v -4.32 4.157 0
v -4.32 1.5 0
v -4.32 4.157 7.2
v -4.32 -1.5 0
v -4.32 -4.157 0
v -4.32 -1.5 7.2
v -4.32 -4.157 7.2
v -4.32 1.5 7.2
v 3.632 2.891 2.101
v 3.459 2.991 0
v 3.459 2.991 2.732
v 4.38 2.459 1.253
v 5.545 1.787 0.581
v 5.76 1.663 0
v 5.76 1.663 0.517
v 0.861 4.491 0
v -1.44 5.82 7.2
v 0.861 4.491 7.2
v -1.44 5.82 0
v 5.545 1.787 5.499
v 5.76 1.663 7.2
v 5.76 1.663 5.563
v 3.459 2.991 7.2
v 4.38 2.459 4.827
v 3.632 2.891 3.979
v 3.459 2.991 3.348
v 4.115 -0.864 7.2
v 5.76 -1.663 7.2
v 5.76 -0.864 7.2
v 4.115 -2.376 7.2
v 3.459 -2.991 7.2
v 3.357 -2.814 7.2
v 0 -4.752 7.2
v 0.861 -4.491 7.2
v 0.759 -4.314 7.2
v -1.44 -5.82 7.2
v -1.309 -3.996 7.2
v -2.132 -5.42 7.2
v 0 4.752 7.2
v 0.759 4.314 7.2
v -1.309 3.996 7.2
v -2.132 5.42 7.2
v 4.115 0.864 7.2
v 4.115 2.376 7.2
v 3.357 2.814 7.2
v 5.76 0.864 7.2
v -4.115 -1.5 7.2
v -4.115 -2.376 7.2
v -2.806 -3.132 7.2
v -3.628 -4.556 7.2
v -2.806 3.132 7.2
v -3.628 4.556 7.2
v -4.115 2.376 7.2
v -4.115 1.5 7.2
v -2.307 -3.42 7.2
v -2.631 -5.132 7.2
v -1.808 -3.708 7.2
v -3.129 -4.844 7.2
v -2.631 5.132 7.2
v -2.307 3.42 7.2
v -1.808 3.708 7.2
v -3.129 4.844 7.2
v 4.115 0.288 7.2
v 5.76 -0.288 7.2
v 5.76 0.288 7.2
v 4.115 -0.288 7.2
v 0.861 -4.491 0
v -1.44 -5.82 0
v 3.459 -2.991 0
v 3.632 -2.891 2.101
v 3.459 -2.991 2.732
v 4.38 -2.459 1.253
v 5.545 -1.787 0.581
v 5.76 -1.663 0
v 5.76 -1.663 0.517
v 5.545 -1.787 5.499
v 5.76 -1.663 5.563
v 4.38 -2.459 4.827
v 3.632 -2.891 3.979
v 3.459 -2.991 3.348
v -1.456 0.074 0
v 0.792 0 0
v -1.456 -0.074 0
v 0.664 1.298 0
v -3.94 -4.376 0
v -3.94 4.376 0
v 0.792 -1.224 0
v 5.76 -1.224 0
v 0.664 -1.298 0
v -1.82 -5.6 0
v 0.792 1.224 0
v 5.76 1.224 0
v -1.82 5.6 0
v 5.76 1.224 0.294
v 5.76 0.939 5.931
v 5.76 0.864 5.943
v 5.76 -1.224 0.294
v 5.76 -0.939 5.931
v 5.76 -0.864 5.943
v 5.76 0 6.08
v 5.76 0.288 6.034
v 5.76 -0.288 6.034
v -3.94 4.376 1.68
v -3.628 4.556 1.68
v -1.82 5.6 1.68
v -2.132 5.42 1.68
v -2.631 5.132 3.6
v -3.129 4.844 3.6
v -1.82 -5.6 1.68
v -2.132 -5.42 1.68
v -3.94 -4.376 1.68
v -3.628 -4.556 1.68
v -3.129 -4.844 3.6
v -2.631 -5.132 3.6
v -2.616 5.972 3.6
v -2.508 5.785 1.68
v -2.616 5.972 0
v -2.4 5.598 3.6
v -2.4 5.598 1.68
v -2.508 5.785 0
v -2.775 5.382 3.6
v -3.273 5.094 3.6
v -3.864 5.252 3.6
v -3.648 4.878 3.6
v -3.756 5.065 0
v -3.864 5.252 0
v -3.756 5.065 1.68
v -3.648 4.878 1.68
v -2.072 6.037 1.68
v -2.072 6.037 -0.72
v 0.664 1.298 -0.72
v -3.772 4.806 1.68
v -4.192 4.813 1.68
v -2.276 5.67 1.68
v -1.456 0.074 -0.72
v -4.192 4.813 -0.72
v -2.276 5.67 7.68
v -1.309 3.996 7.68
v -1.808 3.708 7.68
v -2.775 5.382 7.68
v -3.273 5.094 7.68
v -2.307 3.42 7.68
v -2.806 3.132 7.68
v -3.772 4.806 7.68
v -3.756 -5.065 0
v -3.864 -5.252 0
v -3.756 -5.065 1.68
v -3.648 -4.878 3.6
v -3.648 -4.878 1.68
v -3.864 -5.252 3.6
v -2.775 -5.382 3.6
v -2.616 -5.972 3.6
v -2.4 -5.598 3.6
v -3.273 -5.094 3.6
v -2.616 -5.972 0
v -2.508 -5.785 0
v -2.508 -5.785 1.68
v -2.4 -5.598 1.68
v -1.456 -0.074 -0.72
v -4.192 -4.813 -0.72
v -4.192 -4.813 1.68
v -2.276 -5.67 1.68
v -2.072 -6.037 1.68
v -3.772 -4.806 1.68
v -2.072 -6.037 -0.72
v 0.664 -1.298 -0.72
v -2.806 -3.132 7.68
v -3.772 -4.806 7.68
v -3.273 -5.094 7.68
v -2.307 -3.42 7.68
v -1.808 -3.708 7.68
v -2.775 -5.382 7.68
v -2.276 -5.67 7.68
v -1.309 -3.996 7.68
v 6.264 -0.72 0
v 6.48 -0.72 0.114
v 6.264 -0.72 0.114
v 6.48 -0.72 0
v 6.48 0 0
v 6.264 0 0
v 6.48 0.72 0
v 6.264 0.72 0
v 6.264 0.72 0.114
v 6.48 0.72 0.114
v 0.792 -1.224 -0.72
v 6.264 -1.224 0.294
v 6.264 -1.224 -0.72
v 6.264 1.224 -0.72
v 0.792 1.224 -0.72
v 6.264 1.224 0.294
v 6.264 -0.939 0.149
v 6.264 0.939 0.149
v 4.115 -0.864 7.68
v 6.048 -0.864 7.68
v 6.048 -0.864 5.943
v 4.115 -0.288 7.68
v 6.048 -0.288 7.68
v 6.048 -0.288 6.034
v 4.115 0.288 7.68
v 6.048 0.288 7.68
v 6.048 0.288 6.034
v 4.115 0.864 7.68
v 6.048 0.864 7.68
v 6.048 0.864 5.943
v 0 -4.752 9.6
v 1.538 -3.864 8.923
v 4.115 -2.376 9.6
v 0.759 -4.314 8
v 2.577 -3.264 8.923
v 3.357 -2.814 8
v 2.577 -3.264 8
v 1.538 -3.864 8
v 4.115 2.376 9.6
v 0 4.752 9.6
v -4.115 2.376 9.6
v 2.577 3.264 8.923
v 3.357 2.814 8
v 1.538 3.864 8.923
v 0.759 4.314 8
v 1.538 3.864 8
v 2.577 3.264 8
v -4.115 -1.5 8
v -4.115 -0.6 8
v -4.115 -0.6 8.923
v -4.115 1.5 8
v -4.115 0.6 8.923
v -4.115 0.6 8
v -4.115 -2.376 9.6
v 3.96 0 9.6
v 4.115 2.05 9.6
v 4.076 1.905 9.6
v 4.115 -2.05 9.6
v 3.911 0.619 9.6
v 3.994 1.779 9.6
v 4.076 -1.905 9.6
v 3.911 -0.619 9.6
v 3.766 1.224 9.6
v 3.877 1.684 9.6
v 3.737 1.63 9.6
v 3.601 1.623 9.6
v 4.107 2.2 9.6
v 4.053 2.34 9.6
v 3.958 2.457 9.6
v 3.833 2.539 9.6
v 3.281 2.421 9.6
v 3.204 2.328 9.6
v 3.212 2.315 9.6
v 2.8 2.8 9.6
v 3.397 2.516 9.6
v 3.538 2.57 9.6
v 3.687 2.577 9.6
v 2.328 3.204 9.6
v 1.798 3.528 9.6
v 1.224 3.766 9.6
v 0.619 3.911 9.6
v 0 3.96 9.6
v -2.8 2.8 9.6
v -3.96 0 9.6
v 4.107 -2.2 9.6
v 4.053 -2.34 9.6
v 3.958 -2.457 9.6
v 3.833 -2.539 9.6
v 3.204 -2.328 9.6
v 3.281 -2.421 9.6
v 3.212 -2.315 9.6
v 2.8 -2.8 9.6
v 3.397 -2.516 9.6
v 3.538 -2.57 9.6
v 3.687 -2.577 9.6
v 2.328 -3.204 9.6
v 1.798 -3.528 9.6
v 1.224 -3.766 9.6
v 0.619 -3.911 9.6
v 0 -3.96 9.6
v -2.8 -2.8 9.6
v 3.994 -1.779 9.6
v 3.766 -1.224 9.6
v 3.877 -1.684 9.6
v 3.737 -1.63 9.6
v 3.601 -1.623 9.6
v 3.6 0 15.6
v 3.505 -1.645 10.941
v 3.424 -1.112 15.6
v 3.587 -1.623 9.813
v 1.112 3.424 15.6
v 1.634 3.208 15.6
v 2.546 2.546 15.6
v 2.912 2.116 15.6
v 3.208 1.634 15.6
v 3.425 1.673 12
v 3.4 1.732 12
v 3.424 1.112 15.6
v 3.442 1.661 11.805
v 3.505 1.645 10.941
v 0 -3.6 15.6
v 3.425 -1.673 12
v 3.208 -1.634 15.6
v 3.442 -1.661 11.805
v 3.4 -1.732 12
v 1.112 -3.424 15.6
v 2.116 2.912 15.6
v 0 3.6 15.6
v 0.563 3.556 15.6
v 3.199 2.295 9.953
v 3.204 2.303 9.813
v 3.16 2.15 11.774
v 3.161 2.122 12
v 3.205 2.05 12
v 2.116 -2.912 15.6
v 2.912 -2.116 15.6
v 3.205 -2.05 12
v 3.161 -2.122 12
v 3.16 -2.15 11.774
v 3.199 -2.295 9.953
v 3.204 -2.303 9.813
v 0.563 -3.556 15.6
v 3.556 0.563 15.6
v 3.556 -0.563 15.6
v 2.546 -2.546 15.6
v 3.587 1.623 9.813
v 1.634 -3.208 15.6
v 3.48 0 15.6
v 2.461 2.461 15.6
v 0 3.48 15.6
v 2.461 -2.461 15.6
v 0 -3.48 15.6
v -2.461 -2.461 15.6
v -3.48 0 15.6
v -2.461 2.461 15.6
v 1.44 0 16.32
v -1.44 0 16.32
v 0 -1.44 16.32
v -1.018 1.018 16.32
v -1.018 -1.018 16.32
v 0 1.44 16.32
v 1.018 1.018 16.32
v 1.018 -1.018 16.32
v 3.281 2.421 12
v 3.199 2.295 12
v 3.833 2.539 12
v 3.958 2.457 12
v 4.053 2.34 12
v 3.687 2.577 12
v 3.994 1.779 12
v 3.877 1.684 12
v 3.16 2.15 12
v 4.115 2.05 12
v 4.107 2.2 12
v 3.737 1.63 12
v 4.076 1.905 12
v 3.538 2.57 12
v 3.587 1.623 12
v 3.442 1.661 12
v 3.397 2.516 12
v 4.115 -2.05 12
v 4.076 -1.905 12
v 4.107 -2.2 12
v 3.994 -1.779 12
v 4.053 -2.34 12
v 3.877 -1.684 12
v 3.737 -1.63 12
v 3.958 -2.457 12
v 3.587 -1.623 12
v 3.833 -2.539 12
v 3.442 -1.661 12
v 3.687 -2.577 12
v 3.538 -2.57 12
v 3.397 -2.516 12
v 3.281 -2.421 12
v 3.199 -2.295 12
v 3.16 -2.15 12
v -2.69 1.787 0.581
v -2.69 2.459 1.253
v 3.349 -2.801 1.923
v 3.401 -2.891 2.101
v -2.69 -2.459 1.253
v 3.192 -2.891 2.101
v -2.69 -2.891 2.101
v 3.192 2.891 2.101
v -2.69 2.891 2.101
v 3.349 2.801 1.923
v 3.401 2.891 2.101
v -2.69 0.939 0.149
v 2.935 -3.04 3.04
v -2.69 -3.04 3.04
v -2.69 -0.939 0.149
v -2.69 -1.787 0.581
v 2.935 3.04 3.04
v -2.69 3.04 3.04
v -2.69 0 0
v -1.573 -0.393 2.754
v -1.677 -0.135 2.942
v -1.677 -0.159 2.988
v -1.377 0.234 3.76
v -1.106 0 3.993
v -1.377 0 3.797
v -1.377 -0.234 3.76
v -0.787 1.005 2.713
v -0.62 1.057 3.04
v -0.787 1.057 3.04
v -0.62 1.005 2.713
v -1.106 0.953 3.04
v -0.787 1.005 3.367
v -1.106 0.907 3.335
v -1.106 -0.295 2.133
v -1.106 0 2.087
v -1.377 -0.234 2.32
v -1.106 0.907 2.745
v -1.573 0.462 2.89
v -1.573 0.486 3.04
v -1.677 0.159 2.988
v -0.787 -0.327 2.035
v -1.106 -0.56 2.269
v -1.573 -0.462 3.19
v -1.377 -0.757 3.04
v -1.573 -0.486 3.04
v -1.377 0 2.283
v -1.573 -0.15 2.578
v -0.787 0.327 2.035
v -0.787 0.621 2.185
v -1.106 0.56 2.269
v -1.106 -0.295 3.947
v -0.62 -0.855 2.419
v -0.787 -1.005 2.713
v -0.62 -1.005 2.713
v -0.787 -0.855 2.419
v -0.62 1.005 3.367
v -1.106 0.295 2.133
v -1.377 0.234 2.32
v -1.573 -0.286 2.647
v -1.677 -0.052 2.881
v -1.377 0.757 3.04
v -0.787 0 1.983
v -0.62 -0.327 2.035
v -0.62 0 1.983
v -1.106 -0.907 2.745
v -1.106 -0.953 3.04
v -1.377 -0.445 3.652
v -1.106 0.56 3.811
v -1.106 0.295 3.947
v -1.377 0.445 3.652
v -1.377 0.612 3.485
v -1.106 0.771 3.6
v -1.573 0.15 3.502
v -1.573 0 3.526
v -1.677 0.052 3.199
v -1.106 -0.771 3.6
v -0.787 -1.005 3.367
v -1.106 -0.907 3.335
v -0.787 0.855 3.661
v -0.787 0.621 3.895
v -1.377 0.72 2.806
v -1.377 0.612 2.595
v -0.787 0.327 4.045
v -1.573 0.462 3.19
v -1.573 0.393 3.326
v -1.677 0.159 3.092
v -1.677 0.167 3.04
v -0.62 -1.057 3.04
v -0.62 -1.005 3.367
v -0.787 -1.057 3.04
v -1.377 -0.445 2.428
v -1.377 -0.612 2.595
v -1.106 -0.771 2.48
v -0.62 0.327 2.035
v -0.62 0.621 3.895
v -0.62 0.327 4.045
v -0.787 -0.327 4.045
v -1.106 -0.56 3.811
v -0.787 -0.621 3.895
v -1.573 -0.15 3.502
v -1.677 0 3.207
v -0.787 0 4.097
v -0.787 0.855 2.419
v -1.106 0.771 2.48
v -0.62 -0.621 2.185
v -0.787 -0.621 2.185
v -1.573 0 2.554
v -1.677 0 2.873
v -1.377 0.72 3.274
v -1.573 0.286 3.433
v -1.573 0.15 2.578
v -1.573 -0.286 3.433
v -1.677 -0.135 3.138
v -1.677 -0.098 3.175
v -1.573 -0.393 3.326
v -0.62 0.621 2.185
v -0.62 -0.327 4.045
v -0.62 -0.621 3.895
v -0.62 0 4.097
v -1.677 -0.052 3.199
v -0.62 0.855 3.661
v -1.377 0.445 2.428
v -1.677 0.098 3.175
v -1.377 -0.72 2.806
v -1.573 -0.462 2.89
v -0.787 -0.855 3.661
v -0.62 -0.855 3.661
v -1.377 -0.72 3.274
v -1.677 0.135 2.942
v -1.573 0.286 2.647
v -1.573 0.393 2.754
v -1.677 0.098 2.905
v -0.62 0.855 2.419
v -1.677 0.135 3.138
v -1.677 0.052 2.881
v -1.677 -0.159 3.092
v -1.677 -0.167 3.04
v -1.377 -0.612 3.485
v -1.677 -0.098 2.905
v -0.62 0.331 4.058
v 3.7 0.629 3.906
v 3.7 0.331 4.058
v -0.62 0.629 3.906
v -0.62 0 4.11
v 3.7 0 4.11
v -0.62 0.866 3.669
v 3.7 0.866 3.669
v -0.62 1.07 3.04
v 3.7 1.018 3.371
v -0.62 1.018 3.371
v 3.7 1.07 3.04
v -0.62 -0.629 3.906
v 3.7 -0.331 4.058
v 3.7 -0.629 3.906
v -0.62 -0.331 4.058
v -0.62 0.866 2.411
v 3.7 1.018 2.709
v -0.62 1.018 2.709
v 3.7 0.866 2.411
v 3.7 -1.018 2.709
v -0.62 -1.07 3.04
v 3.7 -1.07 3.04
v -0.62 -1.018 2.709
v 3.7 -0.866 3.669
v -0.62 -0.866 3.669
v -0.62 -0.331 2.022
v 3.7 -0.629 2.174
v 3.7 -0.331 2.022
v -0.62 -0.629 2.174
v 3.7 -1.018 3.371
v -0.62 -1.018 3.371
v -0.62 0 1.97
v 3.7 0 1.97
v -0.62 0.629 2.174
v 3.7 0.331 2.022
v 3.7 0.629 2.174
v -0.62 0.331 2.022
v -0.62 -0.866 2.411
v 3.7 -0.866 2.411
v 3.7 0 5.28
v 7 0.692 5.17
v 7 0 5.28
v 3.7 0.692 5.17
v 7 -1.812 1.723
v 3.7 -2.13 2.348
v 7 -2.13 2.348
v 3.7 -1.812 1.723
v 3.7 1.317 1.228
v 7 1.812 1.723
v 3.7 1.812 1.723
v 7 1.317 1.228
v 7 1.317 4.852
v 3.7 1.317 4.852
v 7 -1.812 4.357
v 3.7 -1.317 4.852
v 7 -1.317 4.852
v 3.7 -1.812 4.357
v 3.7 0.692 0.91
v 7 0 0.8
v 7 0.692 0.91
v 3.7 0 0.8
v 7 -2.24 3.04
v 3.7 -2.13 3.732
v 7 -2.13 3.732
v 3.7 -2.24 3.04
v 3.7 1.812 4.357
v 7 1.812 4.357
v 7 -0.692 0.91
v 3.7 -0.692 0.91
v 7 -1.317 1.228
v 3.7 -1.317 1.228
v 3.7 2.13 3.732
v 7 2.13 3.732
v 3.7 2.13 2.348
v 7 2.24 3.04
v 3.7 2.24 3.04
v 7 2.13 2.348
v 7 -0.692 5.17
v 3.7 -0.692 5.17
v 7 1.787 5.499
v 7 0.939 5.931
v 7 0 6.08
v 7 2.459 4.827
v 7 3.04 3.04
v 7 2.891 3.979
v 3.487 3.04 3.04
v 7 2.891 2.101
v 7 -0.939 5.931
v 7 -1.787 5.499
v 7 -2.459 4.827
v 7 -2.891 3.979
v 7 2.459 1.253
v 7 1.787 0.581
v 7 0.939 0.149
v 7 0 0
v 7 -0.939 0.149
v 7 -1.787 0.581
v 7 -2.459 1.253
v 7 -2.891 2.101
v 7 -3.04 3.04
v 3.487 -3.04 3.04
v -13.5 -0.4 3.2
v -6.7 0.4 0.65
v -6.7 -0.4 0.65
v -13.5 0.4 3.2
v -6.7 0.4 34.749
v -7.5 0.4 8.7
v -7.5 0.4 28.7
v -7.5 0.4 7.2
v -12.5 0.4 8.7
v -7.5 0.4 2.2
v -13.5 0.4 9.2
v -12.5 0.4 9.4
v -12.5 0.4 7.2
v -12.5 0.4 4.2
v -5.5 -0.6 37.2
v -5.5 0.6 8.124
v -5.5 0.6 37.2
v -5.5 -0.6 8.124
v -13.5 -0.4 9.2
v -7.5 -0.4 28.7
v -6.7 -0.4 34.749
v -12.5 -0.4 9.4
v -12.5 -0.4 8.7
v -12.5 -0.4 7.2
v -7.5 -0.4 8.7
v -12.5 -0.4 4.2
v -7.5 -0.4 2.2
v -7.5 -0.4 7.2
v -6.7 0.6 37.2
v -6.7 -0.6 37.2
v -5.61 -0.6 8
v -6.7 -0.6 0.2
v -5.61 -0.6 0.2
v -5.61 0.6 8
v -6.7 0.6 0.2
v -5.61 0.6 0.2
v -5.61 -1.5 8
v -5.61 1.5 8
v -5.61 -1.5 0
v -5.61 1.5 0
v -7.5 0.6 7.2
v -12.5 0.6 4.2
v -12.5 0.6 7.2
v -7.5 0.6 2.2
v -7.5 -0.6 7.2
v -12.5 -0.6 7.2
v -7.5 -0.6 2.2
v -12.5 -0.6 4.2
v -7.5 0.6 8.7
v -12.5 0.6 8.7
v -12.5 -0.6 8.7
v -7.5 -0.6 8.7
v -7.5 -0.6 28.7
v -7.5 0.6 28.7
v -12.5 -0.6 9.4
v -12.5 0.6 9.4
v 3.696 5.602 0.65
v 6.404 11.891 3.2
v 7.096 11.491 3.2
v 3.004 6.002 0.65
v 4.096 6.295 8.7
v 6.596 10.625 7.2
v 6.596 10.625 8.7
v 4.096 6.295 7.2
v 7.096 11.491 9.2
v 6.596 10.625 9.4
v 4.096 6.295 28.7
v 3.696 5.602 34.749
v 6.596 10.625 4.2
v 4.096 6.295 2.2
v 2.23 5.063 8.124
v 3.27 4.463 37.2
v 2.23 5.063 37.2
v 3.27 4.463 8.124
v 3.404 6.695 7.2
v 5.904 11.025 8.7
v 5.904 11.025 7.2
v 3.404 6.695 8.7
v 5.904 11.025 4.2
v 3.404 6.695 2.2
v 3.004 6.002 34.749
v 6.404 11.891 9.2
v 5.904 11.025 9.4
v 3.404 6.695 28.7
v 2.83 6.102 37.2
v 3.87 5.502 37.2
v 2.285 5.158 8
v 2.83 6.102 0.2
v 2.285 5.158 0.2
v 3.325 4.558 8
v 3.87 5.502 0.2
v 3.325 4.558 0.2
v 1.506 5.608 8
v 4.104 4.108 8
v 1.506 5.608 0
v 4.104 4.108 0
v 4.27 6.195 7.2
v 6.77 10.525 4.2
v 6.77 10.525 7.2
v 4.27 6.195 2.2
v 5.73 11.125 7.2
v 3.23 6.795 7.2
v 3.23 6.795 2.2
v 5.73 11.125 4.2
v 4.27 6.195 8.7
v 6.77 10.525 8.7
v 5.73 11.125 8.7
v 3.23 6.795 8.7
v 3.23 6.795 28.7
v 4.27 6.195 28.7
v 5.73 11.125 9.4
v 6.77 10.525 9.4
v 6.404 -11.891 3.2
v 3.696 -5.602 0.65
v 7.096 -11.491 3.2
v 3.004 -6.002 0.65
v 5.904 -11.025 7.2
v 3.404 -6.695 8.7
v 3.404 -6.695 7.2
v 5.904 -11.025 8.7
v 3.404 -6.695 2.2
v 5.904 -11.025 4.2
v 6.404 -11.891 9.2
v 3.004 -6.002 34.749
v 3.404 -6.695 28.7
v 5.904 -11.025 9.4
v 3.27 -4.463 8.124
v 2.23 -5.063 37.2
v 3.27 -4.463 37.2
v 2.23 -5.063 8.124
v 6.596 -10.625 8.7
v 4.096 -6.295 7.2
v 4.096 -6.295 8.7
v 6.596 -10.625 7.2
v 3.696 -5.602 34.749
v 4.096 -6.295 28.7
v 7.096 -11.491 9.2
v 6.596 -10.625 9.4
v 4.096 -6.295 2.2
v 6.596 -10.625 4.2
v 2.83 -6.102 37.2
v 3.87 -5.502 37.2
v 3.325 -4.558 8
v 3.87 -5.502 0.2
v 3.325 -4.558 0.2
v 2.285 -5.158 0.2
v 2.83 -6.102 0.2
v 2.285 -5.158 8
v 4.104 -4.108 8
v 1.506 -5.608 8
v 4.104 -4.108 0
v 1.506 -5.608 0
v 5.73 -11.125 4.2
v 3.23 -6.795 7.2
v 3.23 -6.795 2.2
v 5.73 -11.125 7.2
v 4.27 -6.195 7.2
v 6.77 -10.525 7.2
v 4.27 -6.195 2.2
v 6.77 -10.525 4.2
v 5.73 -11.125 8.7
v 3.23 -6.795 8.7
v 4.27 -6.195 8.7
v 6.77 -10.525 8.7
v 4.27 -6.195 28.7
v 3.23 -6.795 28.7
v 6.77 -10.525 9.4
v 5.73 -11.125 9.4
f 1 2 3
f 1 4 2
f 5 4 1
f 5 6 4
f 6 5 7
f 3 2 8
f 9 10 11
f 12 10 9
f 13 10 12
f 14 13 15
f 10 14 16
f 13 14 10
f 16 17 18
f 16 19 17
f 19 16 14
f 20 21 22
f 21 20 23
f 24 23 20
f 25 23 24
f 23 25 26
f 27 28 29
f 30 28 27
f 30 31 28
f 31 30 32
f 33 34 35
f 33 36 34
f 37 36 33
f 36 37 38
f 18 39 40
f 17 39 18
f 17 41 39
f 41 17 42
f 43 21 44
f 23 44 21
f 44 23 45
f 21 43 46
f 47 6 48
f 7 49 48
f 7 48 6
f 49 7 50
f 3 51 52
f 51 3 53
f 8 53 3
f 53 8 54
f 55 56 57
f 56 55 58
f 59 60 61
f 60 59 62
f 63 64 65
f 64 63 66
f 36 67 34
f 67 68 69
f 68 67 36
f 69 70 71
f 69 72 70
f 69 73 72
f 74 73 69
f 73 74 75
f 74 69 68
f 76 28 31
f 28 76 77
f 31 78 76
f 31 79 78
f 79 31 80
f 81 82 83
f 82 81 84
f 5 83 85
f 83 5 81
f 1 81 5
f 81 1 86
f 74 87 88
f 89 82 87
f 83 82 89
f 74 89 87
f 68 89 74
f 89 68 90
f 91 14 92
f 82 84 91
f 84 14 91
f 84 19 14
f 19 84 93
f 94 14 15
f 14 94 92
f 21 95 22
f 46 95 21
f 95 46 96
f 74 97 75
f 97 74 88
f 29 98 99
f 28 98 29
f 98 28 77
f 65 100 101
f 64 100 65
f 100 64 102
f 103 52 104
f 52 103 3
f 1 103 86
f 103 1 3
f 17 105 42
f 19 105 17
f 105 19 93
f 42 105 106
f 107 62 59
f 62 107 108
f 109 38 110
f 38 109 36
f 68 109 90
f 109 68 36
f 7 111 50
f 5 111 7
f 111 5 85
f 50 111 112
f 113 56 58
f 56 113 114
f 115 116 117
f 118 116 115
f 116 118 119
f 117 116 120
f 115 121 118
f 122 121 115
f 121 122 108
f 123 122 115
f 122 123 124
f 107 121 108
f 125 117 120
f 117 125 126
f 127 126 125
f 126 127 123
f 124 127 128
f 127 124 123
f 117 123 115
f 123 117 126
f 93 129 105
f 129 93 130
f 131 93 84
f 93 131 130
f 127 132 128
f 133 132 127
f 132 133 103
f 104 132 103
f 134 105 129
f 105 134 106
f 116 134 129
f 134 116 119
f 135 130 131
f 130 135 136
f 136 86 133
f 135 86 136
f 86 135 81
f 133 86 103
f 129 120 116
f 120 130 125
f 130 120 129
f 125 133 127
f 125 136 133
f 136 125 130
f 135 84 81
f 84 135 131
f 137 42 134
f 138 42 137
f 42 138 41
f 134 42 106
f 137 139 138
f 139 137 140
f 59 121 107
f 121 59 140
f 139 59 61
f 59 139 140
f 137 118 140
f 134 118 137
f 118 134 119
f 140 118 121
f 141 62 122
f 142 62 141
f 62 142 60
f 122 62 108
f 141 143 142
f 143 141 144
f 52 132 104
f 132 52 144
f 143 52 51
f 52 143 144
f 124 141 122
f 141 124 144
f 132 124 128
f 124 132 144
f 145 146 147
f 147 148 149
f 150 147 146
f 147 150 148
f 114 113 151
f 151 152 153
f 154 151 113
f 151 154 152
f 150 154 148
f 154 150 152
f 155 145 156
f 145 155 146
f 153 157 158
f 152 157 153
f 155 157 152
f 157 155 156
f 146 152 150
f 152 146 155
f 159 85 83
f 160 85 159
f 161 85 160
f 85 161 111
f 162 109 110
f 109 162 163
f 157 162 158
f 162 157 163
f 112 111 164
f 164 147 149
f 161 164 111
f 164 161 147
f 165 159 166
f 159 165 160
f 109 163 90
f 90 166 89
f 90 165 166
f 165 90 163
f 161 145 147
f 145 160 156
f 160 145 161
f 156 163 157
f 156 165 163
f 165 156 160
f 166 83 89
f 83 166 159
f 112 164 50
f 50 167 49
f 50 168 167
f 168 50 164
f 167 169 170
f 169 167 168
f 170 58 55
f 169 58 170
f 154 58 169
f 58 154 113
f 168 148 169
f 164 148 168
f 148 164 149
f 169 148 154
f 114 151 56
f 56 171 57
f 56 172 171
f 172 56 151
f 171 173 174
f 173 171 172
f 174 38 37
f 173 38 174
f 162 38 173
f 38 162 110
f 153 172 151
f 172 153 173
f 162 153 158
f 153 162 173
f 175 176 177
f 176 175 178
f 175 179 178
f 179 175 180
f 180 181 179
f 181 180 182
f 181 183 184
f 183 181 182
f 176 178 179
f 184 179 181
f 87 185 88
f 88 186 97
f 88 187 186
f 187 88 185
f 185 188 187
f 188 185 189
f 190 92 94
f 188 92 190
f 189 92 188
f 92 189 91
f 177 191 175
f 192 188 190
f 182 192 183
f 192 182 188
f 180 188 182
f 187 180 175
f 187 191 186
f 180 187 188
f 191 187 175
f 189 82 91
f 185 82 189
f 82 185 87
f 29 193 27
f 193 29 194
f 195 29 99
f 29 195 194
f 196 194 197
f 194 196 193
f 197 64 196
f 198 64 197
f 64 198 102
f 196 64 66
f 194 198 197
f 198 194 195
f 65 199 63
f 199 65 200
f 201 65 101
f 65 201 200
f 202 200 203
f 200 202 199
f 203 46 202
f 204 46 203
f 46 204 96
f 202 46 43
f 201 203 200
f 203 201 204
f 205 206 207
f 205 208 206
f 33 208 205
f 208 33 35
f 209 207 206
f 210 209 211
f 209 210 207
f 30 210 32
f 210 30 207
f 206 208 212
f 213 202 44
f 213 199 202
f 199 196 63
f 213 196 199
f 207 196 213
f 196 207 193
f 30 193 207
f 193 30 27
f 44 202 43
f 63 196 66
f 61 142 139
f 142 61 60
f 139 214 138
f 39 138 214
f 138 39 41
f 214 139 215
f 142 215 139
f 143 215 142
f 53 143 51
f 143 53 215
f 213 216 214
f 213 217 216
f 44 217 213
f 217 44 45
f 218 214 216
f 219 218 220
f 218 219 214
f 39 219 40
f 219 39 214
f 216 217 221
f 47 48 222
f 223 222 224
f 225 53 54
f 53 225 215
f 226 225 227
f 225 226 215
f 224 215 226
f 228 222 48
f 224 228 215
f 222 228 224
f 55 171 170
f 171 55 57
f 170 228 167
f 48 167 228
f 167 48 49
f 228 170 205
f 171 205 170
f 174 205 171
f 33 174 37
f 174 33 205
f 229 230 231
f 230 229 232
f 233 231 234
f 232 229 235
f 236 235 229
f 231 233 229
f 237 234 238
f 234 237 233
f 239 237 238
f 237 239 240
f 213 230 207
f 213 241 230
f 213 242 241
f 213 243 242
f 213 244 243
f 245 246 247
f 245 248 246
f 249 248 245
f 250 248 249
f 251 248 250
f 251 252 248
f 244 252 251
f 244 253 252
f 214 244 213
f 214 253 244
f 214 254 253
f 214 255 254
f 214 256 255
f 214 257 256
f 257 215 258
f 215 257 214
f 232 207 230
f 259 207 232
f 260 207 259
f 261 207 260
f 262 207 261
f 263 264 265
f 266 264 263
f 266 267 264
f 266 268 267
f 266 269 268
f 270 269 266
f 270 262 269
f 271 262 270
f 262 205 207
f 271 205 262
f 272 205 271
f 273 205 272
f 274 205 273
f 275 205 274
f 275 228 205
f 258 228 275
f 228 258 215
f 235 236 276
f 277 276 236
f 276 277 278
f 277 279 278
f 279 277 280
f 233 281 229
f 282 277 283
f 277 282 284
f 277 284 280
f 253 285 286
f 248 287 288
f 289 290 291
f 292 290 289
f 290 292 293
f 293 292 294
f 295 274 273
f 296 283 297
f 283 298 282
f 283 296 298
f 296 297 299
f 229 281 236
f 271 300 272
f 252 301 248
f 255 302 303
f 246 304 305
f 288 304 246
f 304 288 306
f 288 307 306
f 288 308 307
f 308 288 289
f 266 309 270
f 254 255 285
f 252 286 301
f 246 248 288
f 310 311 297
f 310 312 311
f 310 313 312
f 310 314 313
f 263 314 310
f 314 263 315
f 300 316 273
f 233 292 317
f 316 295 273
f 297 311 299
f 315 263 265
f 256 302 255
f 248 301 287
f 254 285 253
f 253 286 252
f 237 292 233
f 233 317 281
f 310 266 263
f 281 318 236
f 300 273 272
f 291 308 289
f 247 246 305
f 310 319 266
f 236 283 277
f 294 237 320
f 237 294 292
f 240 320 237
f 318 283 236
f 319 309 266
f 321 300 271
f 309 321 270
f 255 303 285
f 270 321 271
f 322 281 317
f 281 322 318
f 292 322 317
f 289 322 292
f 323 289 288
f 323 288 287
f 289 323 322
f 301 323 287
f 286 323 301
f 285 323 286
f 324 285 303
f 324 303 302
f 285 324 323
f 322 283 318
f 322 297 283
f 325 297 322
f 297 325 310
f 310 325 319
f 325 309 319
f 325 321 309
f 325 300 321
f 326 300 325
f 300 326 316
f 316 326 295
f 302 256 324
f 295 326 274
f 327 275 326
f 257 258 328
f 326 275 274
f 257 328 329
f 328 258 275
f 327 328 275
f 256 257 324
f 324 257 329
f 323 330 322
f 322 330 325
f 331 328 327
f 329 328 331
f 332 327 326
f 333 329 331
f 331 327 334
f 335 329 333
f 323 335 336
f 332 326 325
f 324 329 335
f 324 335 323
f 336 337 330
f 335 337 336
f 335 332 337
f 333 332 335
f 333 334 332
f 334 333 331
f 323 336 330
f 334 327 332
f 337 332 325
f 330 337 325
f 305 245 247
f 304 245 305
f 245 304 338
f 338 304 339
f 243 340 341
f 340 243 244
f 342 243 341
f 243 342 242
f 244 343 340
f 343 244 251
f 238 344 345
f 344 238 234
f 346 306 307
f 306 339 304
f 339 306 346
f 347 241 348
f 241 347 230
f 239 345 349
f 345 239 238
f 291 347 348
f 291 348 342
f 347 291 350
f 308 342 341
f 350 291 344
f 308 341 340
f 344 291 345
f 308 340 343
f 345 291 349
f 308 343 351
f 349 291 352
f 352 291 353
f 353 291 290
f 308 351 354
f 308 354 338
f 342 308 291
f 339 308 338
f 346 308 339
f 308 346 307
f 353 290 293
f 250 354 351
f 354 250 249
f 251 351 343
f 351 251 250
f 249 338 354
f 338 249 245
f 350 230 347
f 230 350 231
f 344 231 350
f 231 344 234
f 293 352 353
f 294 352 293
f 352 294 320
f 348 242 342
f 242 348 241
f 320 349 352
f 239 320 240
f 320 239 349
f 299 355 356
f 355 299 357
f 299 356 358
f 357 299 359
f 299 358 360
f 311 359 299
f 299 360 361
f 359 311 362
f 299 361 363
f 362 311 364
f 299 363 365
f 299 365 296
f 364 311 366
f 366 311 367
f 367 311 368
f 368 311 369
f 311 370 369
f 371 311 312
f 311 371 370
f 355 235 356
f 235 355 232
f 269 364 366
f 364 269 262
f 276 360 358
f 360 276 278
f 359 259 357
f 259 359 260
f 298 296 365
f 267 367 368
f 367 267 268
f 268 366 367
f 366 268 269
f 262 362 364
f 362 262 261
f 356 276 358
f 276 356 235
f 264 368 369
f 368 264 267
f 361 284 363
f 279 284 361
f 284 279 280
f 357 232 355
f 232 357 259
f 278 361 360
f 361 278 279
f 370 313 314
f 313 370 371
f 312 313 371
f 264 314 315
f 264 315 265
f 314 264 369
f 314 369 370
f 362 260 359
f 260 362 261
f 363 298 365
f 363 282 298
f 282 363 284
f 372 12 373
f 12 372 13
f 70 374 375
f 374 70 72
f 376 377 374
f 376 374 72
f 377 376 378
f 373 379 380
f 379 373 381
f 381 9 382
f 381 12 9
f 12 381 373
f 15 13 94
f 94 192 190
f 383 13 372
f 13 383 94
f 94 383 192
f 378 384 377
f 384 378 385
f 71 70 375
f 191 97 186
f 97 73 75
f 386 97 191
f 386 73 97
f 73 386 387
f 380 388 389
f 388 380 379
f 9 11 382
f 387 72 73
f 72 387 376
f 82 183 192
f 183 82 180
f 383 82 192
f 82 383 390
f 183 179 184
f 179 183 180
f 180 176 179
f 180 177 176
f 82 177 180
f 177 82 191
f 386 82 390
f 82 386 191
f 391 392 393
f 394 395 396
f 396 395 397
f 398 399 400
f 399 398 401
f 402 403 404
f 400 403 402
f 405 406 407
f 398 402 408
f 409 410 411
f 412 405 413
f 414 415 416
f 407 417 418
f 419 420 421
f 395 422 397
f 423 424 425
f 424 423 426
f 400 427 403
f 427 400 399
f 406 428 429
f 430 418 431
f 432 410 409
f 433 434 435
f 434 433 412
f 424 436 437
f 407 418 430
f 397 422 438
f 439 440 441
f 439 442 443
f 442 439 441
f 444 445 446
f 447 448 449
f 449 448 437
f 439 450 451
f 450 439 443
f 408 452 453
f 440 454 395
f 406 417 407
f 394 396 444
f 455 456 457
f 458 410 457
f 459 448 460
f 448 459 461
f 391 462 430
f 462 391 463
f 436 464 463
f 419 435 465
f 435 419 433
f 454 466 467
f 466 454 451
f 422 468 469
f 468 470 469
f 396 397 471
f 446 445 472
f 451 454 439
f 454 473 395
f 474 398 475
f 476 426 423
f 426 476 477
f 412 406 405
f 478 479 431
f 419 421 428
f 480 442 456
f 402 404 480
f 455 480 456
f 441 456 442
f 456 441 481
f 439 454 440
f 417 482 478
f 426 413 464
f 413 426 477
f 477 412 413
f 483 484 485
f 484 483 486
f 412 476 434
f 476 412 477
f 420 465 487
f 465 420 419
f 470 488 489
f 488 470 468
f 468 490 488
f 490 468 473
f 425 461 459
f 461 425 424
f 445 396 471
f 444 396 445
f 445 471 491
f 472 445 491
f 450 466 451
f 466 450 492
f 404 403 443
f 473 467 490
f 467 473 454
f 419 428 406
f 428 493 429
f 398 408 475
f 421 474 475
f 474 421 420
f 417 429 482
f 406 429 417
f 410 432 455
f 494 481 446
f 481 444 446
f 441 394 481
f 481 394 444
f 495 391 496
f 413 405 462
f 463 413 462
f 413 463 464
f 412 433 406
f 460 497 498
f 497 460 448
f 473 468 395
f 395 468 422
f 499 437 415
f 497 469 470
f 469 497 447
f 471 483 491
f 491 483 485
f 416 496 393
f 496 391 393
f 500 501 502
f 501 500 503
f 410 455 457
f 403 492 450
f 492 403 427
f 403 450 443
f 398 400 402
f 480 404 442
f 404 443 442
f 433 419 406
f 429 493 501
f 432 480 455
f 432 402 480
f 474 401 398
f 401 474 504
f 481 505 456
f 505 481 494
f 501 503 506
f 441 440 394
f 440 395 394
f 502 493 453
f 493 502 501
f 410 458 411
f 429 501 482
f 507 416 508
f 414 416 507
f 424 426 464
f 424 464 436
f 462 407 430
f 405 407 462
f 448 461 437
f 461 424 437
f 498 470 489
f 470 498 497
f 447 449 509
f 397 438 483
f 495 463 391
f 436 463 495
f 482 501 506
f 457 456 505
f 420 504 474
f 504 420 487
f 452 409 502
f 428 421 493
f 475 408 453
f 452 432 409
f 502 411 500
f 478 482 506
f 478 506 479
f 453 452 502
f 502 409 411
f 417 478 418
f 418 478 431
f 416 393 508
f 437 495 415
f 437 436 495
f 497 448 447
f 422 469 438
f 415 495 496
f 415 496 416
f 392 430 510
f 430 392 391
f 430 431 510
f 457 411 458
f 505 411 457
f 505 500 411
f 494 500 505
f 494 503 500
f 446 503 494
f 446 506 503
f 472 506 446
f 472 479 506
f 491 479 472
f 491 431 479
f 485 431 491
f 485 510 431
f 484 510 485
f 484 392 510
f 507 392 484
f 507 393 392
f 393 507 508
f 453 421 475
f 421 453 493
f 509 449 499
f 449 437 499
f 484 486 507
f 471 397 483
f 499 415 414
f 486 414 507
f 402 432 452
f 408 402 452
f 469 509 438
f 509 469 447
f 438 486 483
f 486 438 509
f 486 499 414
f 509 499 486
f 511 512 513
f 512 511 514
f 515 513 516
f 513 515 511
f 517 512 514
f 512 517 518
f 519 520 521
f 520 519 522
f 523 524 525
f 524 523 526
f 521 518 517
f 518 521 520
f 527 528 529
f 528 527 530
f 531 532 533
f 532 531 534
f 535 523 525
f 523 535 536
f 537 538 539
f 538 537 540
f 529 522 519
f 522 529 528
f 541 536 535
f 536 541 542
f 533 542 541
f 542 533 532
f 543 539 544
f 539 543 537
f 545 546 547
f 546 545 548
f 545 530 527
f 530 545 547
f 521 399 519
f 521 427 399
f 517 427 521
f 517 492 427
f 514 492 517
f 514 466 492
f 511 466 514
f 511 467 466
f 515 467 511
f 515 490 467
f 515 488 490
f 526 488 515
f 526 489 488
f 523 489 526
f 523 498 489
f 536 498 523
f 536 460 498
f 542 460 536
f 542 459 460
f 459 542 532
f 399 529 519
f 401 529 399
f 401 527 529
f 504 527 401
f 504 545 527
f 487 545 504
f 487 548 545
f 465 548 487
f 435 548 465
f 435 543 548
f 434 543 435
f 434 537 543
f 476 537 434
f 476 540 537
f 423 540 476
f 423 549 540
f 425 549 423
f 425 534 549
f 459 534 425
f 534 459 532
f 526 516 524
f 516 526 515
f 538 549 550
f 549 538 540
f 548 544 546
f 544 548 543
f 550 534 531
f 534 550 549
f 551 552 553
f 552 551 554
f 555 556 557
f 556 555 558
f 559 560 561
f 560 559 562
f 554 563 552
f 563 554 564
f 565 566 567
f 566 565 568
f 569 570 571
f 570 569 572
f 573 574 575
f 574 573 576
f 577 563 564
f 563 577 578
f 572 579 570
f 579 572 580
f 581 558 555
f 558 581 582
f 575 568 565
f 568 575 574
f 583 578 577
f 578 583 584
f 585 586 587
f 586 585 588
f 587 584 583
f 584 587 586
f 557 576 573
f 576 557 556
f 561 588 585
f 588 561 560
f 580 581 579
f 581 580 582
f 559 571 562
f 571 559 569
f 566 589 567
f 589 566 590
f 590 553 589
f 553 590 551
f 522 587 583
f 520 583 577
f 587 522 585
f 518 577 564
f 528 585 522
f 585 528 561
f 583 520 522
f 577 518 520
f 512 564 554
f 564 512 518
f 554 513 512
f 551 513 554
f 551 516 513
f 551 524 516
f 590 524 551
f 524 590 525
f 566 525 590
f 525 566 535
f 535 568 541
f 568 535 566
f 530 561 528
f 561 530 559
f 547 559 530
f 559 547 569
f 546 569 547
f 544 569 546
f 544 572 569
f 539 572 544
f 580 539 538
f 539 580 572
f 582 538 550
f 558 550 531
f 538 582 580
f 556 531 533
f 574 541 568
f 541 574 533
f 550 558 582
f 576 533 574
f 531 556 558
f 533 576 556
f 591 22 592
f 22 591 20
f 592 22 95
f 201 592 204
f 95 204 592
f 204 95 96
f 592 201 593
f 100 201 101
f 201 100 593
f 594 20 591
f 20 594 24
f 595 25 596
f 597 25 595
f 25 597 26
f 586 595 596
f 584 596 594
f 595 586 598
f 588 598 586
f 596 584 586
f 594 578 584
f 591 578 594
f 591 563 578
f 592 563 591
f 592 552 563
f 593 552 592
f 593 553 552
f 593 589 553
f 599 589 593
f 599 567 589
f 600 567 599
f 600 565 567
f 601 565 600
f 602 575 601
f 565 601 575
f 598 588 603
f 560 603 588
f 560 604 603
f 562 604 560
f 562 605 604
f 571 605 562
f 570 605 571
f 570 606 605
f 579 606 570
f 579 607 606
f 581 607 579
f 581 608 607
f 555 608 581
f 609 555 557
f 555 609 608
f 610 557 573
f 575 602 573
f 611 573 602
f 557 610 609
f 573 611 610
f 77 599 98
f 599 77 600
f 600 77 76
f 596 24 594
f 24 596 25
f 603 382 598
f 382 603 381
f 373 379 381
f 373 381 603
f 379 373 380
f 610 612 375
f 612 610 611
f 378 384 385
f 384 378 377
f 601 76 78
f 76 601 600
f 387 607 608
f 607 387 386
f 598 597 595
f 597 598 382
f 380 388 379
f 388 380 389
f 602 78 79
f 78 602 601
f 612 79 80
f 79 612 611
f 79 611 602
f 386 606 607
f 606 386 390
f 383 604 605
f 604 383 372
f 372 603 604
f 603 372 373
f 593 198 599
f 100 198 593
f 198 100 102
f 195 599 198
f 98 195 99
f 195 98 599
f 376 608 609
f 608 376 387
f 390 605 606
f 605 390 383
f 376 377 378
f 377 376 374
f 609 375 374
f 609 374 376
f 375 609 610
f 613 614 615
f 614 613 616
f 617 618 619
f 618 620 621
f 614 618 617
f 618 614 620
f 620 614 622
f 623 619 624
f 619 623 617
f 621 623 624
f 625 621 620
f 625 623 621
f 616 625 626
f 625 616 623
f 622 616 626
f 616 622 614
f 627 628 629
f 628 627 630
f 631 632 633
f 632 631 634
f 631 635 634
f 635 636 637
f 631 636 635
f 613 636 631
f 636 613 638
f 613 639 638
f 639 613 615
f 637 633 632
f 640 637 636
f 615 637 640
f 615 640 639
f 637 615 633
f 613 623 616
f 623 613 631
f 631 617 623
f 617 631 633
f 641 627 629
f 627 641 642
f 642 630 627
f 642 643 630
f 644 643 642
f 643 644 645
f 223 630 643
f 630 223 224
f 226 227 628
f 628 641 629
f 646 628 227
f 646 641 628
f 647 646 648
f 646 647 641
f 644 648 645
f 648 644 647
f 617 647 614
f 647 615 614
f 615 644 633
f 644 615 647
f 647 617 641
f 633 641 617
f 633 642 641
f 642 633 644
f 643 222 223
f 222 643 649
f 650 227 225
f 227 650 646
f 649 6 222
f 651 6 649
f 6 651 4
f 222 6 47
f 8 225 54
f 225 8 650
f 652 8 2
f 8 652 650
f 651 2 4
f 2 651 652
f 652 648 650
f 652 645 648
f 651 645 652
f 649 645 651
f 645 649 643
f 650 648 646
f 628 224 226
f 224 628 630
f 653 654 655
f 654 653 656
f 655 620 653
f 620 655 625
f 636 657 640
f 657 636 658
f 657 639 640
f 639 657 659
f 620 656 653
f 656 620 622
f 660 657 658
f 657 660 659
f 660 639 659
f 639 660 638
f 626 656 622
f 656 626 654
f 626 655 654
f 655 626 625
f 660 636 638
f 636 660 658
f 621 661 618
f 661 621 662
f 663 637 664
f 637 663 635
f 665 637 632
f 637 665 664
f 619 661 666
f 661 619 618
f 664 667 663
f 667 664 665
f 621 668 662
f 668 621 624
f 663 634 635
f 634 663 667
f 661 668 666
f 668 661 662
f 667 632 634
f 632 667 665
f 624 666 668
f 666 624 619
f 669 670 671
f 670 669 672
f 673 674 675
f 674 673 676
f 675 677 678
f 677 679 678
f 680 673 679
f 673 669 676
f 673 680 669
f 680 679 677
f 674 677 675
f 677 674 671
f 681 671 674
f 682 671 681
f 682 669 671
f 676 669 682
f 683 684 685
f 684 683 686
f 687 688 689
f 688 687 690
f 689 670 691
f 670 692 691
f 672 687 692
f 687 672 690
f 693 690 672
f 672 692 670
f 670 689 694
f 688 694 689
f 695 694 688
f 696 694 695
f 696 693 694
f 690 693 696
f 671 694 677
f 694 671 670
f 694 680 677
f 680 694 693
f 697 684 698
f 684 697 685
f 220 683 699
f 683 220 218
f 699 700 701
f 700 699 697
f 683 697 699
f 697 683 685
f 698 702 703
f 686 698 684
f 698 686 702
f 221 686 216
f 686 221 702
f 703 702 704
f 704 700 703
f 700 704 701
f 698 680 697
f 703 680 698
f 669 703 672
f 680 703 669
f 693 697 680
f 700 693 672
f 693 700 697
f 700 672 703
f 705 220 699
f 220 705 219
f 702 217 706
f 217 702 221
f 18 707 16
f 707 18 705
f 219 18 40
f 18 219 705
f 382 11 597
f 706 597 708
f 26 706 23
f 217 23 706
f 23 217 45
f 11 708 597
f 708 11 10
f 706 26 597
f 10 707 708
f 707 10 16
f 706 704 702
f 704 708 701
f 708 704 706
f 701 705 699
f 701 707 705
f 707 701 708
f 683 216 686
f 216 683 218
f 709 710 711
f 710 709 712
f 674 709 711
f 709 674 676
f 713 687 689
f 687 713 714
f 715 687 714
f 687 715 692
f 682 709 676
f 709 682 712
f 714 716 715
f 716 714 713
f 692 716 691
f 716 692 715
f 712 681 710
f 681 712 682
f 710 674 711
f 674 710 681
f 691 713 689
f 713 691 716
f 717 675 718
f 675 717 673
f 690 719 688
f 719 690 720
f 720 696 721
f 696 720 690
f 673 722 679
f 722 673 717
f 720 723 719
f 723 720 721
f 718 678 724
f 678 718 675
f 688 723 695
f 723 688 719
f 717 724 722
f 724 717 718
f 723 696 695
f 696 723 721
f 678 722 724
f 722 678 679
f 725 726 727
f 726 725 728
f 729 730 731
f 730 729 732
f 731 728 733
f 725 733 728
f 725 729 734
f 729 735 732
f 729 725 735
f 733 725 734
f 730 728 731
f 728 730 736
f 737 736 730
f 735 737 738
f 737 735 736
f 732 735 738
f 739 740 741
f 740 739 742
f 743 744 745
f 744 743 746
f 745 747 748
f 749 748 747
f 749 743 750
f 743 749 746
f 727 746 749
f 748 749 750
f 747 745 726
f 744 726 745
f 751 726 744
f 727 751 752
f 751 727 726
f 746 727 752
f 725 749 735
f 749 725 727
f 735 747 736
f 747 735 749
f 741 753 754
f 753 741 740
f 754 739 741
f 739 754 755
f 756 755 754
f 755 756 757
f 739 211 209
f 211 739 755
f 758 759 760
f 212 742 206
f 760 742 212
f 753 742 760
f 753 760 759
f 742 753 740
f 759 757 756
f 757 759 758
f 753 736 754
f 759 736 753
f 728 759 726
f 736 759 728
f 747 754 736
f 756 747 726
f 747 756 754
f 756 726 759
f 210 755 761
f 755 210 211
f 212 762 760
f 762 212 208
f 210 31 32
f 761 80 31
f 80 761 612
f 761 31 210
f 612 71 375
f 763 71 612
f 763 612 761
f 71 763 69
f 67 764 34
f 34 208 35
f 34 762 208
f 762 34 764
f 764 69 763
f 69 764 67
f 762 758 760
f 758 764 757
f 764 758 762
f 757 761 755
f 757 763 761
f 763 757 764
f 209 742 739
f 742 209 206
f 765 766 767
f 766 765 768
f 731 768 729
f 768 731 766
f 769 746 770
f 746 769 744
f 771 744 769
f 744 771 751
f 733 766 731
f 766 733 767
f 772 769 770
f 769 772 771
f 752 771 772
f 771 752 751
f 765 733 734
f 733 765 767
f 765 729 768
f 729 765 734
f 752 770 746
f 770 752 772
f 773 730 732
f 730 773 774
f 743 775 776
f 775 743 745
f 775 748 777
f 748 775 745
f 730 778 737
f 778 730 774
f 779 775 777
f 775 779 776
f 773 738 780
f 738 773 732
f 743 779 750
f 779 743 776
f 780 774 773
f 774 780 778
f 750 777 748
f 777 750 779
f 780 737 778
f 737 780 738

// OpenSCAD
/* tie-phantom.scad
 *
 * Copyright (C) Robert B. Ross, 2014
 *
 * This software is released under the Creative Commons
 * Attribution-ShareAlike 4.0 International Public License.
 *
 * TODO:
 *
 */



difference() {
    body();
    translate([7,0,0]) rotate([0,-90,0]) connector(internals=false);
}
translate([7,0,0]) rotate([0,-90,0]) connector();

fin();
rotate([0,0,240]) fin();
rotate([0,0,120]) fin();

module body() {
    scale([1.2,1.2,1.2]) {
	/* main body */
	color("grey") scale([1.2,1.2,1]) difference() {
	    cylinder($fn=3, h=6,r=6);
	    translate([4,-2,-0.01]) cube([2,4,9.1]);
	    rotate([0,0,120]) translate([4,-2,-0.01]) cube([2,4,9.1]);
	    rotate([0,0,240]) translate([4,-2,-0.01]) cube([2,4,9.1]);
	}

	color("grey") scale([1.2,1.2,1]) {
	    rotate([0,0,30]) translate([0,0,6]) cylinder($fn=6,r=3.3,h=2);
	    rotate([0,0,30]) bodyDetail1();
	    rotate([0,0,150]) bodyDetail1();
	    rotate([0,0,270]) bodyDetail1();
	}

	/* cockpit */
	rotate([0,0,0]) {
	    color("black") translate([0,0,8]) cylinder($fn=8, r1=3.3,r2=2.9,h=5);
	    
	    color("grey") difference() {
		translate([0,0,8]) cylinder($fn=40,r1=3.3,r2=3,h=5);
		translate([-8,-4,7.5]) cube([8,8,6]);
	    }
	    color("black") translate([0,0,13]) cylinder($fn=8,r1=2.9,r2=1.2,h=0.6);
	}

	rotate([0,0,30]) translate([3.5,0,8]) cylinder($fn=20,r=0.4,h=2);
	rotate([0,0,-30]) translate([3.5,0,8]) cylinder($fn=20,r=0.4,h=2);
    }
}

module bodyDetail1() {
    translate([-0.5,3,0]) cube([1,1.5,3]);
    translate([-1.7/2,0.55,-0.6]) rotate([0,0,0]) cube([1.7,3.8,2]);

    translate([0.2,2.2,1.4]) cube([0.4,2,5]);
    translate([-0.6,2.2,1.4]) cube([0.4,2,5]);
}

module fin() {
    translate([-5.5,0,0.2]) rotate([0,-90,90]) {
	color("grey") {
	/* main fin */
	translate([0,0,-0.4])
	    linear_extrude(height=0.8)
	    polygon(points=[[0,0], [3,8], [9,8], [35.3,1], [35.5,0]],
		    paths = [[0,1,2,3,4,0]]);

	/* fin connection to body */
	translate([0,0,-0.6]) cube([37,1.2,1.2]);
	translate([-0.2,-1.4,-1.5]) cube([8,1.51,3]);
	translate([7,-2.4,-0.6]) rotate([0,0,30]) cube([2,2,1.2]);
	}

	/* fin detail */
	color("black") {
	translate([0,0,-0.6]) linear_extrude(height=1.2)
	    polygon(points=[[2,2], [4,7], [7.0,7], [7.0,2]],
		    paths=[[0,1,2,3,0]]);
	
	translate([0,0,-0.6]) linear_extrude(height=1.2)
	    polygon(points=[[8.5,7], [9.2,7], [28.5,2], [8.5,2]],
		    paths = [[0,1,2,3,0]]);
	}
    }
}

module connector(internals=true) {
    littleRad = 2.14/2;
    littleHt  = 4.32;
    bigRad    = 4.48/2;
    bigHt     = 3.3; // was 4 originally

    $fn=20;

    color("grey") translate([bigRad+0.8,0,0]) difference() {
        cylinder(r1=bigRad+0.8,r2=bigRad+0.8,h=littleRad+littleHt + bigHt + 1);
	if (internals) {
	    translate([0,0,bigHt]) {
		translate([0,0,littleHt]) sphere(r=littleRad);
		translate([0,0,-0.01]) cylinder(r=littleRad, h=littleHt+0.01);
		translate([0,0,-1*bigHt-0.01]) cylinder(r=bigRad, h = bigHt+0.01);
	    }
        }
    }
}


/*
 * Local variables:
 *  mode: C
 *  c-indent-level: 4
 *  c-basic-offset: 4
 * End:
 *
 * vim: ts=8 sts=4 sw=4 expandtab
 */
